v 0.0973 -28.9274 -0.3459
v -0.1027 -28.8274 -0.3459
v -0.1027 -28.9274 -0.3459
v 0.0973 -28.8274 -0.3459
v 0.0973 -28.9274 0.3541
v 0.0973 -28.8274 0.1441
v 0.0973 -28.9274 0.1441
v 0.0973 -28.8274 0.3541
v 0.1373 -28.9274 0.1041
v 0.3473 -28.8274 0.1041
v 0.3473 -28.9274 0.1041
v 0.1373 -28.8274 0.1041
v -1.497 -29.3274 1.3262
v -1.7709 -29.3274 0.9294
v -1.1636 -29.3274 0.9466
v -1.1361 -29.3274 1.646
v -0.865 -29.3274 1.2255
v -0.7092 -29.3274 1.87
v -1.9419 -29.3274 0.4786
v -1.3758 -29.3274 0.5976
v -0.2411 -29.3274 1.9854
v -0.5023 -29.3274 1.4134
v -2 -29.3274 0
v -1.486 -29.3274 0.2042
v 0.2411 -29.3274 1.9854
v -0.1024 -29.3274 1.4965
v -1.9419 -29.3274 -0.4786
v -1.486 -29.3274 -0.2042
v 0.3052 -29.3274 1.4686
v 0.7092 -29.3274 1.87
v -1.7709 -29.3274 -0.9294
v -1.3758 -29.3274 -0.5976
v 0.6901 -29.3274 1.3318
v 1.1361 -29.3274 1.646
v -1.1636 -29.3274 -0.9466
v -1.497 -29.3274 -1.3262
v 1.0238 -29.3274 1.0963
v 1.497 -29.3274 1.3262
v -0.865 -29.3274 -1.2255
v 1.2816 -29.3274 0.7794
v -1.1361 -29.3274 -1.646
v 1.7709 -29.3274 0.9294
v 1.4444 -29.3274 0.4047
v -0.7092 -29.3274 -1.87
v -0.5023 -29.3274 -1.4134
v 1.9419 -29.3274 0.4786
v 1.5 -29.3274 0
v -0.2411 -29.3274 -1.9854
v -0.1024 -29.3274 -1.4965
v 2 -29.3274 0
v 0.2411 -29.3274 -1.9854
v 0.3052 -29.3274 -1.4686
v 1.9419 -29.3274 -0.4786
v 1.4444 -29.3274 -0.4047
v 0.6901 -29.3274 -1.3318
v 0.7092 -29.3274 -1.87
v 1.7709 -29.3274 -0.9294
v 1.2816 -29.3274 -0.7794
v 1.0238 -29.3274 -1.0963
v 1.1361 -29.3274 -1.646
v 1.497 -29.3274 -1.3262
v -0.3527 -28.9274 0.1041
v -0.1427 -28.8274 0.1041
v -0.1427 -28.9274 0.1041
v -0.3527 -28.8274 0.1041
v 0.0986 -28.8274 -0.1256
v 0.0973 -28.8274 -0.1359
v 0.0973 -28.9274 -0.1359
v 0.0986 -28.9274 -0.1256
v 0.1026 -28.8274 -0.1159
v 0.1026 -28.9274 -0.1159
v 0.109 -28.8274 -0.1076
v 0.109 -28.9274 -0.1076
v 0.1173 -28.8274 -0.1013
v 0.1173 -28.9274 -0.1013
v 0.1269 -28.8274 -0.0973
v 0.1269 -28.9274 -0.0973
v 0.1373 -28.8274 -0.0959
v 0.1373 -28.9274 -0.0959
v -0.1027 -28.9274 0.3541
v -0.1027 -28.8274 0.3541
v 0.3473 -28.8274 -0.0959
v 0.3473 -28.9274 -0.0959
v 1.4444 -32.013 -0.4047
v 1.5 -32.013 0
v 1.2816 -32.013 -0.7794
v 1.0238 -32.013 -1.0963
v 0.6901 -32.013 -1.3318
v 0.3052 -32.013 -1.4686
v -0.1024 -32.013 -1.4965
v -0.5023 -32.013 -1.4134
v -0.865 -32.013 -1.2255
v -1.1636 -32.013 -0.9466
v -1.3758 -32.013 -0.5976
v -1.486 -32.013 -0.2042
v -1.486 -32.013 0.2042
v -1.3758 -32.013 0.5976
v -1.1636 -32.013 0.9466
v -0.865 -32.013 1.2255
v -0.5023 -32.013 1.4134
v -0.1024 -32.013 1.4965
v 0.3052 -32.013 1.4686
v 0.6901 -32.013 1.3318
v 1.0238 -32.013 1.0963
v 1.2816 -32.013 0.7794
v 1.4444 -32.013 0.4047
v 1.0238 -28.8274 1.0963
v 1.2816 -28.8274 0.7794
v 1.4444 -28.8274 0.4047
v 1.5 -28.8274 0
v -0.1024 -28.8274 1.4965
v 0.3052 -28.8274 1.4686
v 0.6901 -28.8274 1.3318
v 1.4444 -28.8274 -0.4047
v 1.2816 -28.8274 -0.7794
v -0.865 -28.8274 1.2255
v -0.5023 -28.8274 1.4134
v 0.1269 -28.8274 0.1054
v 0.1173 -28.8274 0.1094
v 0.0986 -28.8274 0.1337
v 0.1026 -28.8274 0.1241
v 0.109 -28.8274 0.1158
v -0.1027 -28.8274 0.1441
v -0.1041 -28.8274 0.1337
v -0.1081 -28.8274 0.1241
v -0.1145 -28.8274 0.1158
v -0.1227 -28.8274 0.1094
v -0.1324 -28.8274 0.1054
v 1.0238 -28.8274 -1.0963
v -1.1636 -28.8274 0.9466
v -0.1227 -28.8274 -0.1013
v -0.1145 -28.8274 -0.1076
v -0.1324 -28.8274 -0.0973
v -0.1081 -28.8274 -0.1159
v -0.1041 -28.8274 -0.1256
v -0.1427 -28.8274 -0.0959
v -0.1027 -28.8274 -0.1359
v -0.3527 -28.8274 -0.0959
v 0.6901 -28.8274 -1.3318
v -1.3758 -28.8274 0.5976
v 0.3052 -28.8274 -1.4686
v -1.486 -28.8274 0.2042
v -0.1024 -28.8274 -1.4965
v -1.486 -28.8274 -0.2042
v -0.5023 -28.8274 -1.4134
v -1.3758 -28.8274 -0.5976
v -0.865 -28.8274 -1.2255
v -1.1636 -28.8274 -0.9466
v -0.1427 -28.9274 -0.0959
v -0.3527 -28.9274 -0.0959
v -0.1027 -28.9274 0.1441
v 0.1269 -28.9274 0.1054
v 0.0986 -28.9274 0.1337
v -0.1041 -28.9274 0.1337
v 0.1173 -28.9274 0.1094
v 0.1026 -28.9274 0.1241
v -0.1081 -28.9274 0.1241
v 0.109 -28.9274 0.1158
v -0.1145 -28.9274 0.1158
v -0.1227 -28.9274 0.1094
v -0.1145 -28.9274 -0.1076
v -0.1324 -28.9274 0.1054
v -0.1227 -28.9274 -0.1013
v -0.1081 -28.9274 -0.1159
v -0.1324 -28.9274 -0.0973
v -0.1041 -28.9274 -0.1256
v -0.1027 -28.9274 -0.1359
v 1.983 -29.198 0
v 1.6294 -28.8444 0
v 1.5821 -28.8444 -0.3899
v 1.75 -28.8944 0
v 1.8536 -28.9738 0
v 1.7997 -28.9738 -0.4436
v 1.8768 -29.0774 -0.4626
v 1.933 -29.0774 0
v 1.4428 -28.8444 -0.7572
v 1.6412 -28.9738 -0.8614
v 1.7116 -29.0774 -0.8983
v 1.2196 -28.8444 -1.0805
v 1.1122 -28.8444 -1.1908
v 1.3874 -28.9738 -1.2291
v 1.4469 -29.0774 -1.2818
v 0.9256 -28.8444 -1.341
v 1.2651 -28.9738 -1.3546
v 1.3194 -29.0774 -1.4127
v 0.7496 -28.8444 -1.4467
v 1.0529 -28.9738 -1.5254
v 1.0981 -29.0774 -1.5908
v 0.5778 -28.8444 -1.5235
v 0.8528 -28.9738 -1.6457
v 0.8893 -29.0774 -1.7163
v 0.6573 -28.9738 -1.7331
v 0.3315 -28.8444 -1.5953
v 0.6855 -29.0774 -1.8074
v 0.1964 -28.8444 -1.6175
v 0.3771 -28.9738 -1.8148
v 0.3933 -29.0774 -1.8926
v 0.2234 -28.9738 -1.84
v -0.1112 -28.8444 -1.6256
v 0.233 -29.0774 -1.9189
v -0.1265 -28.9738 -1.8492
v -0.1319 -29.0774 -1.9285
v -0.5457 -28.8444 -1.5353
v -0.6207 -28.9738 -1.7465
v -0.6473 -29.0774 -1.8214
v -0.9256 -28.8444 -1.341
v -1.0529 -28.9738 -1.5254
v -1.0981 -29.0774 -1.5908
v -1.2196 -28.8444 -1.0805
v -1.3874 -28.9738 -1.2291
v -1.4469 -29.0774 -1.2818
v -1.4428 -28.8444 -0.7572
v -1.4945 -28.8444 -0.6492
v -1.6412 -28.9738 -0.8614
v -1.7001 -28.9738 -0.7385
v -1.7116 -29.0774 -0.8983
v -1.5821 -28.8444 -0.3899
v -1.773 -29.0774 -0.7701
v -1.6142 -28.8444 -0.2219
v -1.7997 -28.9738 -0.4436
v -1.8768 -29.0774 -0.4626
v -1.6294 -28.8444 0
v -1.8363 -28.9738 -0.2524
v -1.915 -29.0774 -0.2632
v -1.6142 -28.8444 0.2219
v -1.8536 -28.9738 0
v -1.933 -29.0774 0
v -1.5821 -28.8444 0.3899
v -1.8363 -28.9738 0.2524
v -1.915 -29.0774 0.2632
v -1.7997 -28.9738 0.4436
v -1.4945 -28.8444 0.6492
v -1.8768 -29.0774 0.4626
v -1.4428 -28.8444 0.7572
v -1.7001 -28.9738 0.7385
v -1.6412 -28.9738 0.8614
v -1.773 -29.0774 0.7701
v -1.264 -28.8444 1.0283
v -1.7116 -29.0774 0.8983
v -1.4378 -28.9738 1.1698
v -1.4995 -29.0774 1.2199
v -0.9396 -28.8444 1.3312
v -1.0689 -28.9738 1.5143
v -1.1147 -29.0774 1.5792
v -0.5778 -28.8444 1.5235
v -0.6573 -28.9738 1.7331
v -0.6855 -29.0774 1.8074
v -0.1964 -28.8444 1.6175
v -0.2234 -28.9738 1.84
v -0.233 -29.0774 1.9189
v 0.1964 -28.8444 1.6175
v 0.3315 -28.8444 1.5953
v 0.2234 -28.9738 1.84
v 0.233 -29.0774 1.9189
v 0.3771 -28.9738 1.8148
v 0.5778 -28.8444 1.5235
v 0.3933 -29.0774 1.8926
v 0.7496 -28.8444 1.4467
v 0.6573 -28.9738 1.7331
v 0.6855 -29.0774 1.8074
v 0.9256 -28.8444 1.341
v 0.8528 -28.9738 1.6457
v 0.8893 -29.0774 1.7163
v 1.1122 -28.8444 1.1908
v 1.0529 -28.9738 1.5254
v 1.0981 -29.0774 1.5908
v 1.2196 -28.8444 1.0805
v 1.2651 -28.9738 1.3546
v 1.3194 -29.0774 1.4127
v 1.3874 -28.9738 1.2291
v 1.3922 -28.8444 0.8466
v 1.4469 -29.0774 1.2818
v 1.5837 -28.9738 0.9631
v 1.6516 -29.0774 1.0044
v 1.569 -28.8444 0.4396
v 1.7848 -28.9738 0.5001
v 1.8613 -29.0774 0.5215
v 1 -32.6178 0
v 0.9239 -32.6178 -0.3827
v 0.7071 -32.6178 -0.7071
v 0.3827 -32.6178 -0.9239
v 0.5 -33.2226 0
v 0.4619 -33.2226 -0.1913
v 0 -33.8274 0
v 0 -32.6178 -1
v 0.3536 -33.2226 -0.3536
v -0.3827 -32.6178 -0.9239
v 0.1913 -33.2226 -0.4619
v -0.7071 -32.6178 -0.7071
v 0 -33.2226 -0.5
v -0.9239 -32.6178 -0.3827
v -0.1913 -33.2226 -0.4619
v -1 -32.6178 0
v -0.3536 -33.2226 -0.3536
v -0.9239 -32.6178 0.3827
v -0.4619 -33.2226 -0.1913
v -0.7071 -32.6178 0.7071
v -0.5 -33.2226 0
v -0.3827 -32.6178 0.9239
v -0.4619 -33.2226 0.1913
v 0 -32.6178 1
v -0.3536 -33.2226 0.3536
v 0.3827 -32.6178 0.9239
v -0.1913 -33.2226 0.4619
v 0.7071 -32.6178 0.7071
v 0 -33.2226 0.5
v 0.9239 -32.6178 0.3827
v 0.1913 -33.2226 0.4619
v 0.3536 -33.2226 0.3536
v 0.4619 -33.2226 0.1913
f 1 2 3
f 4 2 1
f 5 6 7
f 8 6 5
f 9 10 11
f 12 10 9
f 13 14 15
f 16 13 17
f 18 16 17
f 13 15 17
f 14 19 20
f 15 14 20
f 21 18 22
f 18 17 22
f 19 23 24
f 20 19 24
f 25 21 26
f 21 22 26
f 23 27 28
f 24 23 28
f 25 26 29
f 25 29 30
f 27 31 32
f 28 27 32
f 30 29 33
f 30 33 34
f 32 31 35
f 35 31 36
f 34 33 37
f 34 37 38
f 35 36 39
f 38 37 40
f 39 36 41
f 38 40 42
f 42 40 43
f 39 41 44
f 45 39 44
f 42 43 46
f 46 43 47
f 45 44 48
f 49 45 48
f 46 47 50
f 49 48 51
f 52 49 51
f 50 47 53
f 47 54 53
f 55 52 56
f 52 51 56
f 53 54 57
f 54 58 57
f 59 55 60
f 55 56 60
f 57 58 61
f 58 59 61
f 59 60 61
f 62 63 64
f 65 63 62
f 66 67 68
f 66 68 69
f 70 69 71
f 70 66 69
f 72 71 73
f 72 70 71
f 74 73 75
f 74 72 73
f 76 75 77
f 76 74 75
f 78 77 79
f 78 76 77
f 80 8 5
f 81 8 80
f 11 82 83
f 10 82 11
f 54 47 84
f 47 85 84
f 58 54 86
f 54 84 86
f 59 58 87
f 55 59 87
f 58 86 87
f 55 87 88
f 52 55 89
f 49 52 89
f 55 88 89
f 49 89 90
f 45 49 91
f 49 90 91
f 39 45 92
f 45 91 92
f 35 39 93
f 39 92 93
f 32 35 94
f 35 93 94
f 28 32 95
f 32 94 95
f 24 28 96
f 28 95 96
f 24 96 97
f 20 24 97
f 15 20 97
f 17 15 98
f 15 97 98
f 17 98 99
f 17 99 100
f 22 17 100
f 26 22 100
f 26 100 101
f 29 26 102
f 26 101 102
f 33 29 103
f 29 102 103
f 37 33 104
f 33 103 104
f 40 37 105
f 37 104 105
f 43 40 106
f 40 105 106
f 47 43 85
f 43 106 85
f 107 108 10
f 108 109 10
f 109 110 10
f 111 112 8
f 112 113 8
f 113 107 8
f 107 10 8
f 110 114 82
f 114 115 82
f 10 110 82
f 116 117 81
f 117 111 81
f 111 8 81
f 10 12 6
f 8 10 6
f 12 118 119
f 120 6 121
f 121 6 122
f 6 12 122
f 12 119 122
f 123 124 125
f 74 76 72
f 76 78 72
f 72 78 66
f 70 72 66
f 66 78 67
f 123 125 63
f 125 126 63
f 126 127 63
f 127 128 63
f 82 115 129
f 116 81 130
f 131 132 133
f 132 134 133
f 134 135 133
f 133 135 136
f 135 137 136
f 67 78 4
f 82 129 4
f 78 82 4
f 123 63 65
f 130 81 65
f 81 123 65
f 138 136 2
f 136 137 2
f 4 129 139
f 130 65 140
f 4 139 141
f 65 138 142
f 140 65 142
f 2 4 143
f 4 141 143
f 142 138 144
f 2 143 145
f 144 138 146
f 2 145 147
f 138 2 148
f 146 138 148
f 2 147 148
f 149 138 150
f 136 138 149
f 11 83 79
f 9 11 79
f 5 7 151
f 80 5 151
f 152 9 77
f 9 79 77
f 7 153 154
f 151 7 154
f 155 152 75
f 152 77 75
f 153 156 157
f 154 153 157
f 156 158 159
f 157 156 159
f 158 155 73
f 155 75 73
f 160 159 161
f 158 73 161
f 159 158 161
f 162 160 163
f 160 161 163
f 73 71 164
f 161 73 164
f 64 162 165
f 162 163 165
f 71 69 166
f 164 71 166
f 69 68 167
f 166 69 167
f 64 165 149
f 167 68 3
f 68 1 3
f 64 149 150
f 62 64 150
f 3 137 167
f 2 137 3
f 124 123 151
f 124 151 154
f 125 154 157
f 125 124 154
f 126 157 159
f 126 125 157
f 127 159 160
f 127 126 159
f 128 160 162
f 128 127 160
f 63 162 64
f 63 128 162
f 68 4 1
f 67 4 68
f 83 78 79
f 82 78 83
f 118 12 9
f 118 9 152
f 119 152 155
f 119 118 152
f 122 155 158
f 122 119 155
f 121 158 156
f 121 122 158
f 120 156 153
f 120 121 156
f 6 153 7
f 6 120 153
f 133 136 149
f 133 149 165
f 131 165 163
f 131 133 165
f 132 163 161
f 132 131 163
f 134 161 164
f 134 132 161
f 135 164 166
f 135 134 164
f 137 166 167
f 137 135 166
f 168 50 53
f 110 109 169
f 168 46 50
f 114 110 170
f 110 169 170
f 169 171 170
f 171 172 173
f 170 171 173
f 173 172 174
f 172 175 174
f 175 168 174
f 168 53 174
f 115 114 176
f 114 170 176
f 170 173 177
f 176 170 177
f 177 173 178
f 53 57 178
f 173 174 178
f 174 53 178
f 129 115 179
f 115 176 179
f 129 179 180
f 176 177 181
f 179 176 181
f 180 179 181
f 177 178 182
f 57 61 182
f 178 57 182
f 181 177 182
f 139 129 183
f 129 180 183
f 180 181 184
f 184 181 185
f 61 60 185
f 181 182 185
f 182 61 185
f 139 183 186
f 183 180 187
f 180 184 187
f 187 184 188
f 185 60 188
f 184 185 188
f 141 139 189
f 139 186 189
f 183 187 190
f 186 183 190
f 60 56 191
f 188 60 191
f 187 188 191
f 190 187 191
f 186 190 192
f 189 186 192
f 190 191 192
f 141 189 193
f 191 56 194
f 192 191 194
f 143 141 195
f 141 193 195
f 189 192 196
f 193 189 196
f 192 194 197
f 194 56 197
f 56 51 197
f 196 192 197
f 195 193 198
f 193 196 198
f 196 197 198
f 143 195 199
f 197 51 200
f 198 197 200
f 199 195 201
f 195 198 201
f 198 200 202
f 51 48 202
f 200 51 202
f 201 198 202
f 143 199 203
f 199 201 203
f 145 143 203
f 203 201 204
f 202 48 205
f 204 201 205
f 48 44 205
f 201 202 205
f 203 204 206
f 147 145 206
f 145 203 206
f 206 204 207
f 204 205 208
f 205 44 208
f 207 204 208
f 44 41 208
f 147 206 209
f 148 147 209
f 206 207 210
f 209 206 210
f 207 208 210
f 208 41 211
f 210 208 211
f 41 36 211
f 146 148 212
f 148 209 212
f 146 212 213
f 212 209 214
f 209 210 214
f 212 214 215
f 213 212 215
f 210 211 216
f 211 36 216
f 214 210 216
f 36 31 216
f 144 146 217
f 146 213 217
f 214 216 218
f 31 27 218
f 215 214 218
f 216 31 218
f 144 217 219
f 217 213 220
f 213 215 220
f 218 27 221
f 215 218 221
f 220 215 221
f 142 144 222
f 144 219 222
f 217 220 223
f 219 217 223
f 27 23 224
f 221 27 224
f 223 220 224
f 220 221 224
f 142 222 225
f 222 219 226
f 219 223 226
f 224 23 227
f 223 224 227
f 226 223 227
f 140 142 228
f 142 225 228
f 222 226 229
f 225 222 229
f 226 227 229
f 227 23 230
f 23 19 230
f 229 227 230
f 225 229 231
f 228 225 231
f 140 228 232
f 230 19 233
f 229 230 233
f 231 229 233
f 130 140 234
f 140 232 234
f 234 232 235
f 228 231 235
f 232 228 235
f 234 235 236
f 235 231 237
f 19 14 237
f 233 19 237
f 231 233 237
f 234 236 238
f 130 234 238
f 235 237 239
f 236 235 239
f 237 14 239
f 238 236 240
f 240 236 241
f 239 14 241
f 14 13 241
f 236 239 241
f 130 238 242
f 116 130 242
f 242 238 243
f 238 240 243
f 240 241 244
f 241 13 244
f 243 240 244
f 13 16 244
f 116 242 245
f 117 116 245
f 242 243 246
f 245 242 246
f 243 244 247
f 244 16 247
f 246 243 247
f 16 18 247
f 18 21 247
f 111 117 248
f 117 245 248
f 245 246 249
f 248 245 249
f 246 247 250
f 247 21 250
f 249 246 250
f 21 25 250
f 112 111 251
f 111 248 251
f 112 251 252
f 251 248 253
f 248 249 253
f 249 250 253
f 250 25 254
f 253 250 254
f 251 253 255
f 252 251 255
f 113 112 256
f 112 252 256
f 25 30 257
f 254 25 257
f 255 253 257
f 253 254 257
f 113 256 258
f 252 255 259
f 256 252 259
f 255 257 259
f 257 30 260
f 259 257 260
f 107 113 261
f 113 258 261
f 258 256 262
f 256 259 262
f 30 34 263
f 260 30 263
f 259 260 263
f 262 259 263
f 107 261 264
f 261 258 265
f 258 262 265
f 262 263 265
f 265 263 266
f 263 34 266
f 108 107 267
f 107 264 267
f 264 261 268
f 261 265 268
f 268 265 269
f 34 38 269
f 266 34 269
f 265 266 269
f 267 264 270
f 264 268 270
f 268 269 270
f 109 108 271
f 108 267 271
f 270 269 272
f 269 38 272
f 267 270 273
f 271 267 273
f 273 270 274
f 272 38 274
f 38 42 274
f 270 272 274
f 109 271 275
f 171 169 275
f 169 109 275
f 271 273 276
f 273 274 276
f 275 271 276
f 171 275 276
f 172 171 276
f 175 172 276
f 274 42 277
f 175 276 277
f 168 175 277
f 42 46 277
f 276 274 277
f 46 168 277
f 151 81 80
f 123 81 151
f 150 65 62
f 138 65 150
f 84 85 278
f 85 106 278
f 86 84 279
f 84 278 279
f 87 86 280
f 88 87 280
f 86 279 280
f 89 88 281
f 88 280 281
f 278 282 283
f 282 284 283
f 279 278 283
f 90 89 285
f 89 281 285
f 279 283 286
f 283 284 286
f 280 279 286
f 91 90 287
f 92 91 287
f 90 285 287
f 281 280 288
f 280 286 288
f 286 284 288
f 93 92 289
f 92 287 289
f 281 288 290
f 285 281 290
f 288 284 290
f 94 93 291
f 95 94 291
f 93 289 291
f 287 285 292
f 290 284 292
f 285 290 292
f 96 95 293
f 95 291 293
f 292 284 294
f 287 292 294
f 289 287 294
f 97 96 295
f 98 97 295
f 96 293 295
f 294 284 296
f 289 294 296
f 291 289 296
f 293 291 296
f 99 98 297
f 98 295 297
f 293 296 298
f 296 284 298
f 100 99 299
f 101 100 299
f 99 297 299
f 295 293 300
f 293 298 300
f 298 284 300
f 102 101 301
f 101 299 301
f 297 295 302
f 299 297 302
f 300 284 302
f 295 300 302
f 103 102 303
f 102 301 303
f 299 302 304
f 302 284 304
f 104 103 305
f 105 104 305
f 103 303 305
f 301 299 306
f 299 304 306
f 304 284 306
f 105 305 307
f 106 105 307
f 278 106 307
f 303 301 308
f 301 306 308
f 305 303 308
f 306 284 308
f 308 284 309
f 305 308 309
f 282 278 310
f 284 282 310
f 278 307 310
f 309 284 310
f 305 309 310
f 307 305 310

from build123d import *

# Parameters (mm, degrees)
CUT_EXTRUDE1_DEPTH = 0.1


with BuildPart() as part:
    # Sketch1 → Revolve1 (revolve)
    with BuildSketch(Plane.XY):
        with BuildLine():
            Line((0, -33.827367013), (0, -28.827367013))
            Line((0, -28.827367013), (1.5, -28.827367013))
            ThreePointArc((1.5, -28.827367013), (1.853553391, -28.973813622), (2, -29.327367013))
            Line((2, -29.327367013), (1.5, -29.327367013))
            Line((1.5, -29.327367013), (1.5, -32.013019536))
            Line((1.5, -32.013019536), (0, -33.827367013))
        make_face()
    revolve(axis=Axis((0, -33.827367013, 0), (0, 1, 0)))

    # Sketch2 → Cut-Extrude1 (cut)
    with BuildSketch(Plane(origin=(0, -28.827367013, 0), x_dir=(1, 0, 0), z_dir=(0, 1, 0))):
        with BuildLine():
            Line((-0.102740447, 0.345923698), (0.097259553, 0.345923698))
            Line((0.097259553, 0.345923698), (0.097259553, 0.135923698))
            ThreePointArc((0.097259553, 0.135923698), (0.108975282, 0.107639426), (0.137259553, 0.095923698))
            Line((0.137259553, 0.095923698), (0.347259553, 0.095923698))
            Line((0.347259553, 0.095923698), (0.347259553, -0.104076302))
            Line((0.347259553, -0.104076302), (0.137259553, -0.104076302))
            ThreePointArc((0.137259553, -0.104076302), (0.108975282, -0.115792031), (0.097259553, -0.144076302))
            Line((0.097259553, -0.144076302), (0.097259553, -0.354076302))
            Line((0.097259553, -0.354076302), (-0.102740447, -0.354076302))
            Line((-0.102740447, -0.354076302), (-0.102740447, -0.144076302))
            ThreePointArc((-0.102740447, -0.144076302), (-0.114456176, -0.115792031), (-0.142740447, -0.104076302))
            Line((-0.142740447, -0.104076302), (-0.352740447, -0.104076302))
            Line((-0.352740447, -0.104076302), (-0.352740447, 0.095923698))
            Line((-0.352740447, 0.095923698), (-0.142740447, 0.095923698))
            ThreePointArc((-0.142740447, 0.095923698), (-0.114456176, 0.107639426), (-0.102740447, 0.135923698))
            Line((-0.102740447, 0.135923698), (-0.102740447, 0.345923698))
        make_face()
    extrude(amount=-CUT_EXTRUDE1_DEPTH, mode=Mode.SUBTRACT)


solid = part.part
